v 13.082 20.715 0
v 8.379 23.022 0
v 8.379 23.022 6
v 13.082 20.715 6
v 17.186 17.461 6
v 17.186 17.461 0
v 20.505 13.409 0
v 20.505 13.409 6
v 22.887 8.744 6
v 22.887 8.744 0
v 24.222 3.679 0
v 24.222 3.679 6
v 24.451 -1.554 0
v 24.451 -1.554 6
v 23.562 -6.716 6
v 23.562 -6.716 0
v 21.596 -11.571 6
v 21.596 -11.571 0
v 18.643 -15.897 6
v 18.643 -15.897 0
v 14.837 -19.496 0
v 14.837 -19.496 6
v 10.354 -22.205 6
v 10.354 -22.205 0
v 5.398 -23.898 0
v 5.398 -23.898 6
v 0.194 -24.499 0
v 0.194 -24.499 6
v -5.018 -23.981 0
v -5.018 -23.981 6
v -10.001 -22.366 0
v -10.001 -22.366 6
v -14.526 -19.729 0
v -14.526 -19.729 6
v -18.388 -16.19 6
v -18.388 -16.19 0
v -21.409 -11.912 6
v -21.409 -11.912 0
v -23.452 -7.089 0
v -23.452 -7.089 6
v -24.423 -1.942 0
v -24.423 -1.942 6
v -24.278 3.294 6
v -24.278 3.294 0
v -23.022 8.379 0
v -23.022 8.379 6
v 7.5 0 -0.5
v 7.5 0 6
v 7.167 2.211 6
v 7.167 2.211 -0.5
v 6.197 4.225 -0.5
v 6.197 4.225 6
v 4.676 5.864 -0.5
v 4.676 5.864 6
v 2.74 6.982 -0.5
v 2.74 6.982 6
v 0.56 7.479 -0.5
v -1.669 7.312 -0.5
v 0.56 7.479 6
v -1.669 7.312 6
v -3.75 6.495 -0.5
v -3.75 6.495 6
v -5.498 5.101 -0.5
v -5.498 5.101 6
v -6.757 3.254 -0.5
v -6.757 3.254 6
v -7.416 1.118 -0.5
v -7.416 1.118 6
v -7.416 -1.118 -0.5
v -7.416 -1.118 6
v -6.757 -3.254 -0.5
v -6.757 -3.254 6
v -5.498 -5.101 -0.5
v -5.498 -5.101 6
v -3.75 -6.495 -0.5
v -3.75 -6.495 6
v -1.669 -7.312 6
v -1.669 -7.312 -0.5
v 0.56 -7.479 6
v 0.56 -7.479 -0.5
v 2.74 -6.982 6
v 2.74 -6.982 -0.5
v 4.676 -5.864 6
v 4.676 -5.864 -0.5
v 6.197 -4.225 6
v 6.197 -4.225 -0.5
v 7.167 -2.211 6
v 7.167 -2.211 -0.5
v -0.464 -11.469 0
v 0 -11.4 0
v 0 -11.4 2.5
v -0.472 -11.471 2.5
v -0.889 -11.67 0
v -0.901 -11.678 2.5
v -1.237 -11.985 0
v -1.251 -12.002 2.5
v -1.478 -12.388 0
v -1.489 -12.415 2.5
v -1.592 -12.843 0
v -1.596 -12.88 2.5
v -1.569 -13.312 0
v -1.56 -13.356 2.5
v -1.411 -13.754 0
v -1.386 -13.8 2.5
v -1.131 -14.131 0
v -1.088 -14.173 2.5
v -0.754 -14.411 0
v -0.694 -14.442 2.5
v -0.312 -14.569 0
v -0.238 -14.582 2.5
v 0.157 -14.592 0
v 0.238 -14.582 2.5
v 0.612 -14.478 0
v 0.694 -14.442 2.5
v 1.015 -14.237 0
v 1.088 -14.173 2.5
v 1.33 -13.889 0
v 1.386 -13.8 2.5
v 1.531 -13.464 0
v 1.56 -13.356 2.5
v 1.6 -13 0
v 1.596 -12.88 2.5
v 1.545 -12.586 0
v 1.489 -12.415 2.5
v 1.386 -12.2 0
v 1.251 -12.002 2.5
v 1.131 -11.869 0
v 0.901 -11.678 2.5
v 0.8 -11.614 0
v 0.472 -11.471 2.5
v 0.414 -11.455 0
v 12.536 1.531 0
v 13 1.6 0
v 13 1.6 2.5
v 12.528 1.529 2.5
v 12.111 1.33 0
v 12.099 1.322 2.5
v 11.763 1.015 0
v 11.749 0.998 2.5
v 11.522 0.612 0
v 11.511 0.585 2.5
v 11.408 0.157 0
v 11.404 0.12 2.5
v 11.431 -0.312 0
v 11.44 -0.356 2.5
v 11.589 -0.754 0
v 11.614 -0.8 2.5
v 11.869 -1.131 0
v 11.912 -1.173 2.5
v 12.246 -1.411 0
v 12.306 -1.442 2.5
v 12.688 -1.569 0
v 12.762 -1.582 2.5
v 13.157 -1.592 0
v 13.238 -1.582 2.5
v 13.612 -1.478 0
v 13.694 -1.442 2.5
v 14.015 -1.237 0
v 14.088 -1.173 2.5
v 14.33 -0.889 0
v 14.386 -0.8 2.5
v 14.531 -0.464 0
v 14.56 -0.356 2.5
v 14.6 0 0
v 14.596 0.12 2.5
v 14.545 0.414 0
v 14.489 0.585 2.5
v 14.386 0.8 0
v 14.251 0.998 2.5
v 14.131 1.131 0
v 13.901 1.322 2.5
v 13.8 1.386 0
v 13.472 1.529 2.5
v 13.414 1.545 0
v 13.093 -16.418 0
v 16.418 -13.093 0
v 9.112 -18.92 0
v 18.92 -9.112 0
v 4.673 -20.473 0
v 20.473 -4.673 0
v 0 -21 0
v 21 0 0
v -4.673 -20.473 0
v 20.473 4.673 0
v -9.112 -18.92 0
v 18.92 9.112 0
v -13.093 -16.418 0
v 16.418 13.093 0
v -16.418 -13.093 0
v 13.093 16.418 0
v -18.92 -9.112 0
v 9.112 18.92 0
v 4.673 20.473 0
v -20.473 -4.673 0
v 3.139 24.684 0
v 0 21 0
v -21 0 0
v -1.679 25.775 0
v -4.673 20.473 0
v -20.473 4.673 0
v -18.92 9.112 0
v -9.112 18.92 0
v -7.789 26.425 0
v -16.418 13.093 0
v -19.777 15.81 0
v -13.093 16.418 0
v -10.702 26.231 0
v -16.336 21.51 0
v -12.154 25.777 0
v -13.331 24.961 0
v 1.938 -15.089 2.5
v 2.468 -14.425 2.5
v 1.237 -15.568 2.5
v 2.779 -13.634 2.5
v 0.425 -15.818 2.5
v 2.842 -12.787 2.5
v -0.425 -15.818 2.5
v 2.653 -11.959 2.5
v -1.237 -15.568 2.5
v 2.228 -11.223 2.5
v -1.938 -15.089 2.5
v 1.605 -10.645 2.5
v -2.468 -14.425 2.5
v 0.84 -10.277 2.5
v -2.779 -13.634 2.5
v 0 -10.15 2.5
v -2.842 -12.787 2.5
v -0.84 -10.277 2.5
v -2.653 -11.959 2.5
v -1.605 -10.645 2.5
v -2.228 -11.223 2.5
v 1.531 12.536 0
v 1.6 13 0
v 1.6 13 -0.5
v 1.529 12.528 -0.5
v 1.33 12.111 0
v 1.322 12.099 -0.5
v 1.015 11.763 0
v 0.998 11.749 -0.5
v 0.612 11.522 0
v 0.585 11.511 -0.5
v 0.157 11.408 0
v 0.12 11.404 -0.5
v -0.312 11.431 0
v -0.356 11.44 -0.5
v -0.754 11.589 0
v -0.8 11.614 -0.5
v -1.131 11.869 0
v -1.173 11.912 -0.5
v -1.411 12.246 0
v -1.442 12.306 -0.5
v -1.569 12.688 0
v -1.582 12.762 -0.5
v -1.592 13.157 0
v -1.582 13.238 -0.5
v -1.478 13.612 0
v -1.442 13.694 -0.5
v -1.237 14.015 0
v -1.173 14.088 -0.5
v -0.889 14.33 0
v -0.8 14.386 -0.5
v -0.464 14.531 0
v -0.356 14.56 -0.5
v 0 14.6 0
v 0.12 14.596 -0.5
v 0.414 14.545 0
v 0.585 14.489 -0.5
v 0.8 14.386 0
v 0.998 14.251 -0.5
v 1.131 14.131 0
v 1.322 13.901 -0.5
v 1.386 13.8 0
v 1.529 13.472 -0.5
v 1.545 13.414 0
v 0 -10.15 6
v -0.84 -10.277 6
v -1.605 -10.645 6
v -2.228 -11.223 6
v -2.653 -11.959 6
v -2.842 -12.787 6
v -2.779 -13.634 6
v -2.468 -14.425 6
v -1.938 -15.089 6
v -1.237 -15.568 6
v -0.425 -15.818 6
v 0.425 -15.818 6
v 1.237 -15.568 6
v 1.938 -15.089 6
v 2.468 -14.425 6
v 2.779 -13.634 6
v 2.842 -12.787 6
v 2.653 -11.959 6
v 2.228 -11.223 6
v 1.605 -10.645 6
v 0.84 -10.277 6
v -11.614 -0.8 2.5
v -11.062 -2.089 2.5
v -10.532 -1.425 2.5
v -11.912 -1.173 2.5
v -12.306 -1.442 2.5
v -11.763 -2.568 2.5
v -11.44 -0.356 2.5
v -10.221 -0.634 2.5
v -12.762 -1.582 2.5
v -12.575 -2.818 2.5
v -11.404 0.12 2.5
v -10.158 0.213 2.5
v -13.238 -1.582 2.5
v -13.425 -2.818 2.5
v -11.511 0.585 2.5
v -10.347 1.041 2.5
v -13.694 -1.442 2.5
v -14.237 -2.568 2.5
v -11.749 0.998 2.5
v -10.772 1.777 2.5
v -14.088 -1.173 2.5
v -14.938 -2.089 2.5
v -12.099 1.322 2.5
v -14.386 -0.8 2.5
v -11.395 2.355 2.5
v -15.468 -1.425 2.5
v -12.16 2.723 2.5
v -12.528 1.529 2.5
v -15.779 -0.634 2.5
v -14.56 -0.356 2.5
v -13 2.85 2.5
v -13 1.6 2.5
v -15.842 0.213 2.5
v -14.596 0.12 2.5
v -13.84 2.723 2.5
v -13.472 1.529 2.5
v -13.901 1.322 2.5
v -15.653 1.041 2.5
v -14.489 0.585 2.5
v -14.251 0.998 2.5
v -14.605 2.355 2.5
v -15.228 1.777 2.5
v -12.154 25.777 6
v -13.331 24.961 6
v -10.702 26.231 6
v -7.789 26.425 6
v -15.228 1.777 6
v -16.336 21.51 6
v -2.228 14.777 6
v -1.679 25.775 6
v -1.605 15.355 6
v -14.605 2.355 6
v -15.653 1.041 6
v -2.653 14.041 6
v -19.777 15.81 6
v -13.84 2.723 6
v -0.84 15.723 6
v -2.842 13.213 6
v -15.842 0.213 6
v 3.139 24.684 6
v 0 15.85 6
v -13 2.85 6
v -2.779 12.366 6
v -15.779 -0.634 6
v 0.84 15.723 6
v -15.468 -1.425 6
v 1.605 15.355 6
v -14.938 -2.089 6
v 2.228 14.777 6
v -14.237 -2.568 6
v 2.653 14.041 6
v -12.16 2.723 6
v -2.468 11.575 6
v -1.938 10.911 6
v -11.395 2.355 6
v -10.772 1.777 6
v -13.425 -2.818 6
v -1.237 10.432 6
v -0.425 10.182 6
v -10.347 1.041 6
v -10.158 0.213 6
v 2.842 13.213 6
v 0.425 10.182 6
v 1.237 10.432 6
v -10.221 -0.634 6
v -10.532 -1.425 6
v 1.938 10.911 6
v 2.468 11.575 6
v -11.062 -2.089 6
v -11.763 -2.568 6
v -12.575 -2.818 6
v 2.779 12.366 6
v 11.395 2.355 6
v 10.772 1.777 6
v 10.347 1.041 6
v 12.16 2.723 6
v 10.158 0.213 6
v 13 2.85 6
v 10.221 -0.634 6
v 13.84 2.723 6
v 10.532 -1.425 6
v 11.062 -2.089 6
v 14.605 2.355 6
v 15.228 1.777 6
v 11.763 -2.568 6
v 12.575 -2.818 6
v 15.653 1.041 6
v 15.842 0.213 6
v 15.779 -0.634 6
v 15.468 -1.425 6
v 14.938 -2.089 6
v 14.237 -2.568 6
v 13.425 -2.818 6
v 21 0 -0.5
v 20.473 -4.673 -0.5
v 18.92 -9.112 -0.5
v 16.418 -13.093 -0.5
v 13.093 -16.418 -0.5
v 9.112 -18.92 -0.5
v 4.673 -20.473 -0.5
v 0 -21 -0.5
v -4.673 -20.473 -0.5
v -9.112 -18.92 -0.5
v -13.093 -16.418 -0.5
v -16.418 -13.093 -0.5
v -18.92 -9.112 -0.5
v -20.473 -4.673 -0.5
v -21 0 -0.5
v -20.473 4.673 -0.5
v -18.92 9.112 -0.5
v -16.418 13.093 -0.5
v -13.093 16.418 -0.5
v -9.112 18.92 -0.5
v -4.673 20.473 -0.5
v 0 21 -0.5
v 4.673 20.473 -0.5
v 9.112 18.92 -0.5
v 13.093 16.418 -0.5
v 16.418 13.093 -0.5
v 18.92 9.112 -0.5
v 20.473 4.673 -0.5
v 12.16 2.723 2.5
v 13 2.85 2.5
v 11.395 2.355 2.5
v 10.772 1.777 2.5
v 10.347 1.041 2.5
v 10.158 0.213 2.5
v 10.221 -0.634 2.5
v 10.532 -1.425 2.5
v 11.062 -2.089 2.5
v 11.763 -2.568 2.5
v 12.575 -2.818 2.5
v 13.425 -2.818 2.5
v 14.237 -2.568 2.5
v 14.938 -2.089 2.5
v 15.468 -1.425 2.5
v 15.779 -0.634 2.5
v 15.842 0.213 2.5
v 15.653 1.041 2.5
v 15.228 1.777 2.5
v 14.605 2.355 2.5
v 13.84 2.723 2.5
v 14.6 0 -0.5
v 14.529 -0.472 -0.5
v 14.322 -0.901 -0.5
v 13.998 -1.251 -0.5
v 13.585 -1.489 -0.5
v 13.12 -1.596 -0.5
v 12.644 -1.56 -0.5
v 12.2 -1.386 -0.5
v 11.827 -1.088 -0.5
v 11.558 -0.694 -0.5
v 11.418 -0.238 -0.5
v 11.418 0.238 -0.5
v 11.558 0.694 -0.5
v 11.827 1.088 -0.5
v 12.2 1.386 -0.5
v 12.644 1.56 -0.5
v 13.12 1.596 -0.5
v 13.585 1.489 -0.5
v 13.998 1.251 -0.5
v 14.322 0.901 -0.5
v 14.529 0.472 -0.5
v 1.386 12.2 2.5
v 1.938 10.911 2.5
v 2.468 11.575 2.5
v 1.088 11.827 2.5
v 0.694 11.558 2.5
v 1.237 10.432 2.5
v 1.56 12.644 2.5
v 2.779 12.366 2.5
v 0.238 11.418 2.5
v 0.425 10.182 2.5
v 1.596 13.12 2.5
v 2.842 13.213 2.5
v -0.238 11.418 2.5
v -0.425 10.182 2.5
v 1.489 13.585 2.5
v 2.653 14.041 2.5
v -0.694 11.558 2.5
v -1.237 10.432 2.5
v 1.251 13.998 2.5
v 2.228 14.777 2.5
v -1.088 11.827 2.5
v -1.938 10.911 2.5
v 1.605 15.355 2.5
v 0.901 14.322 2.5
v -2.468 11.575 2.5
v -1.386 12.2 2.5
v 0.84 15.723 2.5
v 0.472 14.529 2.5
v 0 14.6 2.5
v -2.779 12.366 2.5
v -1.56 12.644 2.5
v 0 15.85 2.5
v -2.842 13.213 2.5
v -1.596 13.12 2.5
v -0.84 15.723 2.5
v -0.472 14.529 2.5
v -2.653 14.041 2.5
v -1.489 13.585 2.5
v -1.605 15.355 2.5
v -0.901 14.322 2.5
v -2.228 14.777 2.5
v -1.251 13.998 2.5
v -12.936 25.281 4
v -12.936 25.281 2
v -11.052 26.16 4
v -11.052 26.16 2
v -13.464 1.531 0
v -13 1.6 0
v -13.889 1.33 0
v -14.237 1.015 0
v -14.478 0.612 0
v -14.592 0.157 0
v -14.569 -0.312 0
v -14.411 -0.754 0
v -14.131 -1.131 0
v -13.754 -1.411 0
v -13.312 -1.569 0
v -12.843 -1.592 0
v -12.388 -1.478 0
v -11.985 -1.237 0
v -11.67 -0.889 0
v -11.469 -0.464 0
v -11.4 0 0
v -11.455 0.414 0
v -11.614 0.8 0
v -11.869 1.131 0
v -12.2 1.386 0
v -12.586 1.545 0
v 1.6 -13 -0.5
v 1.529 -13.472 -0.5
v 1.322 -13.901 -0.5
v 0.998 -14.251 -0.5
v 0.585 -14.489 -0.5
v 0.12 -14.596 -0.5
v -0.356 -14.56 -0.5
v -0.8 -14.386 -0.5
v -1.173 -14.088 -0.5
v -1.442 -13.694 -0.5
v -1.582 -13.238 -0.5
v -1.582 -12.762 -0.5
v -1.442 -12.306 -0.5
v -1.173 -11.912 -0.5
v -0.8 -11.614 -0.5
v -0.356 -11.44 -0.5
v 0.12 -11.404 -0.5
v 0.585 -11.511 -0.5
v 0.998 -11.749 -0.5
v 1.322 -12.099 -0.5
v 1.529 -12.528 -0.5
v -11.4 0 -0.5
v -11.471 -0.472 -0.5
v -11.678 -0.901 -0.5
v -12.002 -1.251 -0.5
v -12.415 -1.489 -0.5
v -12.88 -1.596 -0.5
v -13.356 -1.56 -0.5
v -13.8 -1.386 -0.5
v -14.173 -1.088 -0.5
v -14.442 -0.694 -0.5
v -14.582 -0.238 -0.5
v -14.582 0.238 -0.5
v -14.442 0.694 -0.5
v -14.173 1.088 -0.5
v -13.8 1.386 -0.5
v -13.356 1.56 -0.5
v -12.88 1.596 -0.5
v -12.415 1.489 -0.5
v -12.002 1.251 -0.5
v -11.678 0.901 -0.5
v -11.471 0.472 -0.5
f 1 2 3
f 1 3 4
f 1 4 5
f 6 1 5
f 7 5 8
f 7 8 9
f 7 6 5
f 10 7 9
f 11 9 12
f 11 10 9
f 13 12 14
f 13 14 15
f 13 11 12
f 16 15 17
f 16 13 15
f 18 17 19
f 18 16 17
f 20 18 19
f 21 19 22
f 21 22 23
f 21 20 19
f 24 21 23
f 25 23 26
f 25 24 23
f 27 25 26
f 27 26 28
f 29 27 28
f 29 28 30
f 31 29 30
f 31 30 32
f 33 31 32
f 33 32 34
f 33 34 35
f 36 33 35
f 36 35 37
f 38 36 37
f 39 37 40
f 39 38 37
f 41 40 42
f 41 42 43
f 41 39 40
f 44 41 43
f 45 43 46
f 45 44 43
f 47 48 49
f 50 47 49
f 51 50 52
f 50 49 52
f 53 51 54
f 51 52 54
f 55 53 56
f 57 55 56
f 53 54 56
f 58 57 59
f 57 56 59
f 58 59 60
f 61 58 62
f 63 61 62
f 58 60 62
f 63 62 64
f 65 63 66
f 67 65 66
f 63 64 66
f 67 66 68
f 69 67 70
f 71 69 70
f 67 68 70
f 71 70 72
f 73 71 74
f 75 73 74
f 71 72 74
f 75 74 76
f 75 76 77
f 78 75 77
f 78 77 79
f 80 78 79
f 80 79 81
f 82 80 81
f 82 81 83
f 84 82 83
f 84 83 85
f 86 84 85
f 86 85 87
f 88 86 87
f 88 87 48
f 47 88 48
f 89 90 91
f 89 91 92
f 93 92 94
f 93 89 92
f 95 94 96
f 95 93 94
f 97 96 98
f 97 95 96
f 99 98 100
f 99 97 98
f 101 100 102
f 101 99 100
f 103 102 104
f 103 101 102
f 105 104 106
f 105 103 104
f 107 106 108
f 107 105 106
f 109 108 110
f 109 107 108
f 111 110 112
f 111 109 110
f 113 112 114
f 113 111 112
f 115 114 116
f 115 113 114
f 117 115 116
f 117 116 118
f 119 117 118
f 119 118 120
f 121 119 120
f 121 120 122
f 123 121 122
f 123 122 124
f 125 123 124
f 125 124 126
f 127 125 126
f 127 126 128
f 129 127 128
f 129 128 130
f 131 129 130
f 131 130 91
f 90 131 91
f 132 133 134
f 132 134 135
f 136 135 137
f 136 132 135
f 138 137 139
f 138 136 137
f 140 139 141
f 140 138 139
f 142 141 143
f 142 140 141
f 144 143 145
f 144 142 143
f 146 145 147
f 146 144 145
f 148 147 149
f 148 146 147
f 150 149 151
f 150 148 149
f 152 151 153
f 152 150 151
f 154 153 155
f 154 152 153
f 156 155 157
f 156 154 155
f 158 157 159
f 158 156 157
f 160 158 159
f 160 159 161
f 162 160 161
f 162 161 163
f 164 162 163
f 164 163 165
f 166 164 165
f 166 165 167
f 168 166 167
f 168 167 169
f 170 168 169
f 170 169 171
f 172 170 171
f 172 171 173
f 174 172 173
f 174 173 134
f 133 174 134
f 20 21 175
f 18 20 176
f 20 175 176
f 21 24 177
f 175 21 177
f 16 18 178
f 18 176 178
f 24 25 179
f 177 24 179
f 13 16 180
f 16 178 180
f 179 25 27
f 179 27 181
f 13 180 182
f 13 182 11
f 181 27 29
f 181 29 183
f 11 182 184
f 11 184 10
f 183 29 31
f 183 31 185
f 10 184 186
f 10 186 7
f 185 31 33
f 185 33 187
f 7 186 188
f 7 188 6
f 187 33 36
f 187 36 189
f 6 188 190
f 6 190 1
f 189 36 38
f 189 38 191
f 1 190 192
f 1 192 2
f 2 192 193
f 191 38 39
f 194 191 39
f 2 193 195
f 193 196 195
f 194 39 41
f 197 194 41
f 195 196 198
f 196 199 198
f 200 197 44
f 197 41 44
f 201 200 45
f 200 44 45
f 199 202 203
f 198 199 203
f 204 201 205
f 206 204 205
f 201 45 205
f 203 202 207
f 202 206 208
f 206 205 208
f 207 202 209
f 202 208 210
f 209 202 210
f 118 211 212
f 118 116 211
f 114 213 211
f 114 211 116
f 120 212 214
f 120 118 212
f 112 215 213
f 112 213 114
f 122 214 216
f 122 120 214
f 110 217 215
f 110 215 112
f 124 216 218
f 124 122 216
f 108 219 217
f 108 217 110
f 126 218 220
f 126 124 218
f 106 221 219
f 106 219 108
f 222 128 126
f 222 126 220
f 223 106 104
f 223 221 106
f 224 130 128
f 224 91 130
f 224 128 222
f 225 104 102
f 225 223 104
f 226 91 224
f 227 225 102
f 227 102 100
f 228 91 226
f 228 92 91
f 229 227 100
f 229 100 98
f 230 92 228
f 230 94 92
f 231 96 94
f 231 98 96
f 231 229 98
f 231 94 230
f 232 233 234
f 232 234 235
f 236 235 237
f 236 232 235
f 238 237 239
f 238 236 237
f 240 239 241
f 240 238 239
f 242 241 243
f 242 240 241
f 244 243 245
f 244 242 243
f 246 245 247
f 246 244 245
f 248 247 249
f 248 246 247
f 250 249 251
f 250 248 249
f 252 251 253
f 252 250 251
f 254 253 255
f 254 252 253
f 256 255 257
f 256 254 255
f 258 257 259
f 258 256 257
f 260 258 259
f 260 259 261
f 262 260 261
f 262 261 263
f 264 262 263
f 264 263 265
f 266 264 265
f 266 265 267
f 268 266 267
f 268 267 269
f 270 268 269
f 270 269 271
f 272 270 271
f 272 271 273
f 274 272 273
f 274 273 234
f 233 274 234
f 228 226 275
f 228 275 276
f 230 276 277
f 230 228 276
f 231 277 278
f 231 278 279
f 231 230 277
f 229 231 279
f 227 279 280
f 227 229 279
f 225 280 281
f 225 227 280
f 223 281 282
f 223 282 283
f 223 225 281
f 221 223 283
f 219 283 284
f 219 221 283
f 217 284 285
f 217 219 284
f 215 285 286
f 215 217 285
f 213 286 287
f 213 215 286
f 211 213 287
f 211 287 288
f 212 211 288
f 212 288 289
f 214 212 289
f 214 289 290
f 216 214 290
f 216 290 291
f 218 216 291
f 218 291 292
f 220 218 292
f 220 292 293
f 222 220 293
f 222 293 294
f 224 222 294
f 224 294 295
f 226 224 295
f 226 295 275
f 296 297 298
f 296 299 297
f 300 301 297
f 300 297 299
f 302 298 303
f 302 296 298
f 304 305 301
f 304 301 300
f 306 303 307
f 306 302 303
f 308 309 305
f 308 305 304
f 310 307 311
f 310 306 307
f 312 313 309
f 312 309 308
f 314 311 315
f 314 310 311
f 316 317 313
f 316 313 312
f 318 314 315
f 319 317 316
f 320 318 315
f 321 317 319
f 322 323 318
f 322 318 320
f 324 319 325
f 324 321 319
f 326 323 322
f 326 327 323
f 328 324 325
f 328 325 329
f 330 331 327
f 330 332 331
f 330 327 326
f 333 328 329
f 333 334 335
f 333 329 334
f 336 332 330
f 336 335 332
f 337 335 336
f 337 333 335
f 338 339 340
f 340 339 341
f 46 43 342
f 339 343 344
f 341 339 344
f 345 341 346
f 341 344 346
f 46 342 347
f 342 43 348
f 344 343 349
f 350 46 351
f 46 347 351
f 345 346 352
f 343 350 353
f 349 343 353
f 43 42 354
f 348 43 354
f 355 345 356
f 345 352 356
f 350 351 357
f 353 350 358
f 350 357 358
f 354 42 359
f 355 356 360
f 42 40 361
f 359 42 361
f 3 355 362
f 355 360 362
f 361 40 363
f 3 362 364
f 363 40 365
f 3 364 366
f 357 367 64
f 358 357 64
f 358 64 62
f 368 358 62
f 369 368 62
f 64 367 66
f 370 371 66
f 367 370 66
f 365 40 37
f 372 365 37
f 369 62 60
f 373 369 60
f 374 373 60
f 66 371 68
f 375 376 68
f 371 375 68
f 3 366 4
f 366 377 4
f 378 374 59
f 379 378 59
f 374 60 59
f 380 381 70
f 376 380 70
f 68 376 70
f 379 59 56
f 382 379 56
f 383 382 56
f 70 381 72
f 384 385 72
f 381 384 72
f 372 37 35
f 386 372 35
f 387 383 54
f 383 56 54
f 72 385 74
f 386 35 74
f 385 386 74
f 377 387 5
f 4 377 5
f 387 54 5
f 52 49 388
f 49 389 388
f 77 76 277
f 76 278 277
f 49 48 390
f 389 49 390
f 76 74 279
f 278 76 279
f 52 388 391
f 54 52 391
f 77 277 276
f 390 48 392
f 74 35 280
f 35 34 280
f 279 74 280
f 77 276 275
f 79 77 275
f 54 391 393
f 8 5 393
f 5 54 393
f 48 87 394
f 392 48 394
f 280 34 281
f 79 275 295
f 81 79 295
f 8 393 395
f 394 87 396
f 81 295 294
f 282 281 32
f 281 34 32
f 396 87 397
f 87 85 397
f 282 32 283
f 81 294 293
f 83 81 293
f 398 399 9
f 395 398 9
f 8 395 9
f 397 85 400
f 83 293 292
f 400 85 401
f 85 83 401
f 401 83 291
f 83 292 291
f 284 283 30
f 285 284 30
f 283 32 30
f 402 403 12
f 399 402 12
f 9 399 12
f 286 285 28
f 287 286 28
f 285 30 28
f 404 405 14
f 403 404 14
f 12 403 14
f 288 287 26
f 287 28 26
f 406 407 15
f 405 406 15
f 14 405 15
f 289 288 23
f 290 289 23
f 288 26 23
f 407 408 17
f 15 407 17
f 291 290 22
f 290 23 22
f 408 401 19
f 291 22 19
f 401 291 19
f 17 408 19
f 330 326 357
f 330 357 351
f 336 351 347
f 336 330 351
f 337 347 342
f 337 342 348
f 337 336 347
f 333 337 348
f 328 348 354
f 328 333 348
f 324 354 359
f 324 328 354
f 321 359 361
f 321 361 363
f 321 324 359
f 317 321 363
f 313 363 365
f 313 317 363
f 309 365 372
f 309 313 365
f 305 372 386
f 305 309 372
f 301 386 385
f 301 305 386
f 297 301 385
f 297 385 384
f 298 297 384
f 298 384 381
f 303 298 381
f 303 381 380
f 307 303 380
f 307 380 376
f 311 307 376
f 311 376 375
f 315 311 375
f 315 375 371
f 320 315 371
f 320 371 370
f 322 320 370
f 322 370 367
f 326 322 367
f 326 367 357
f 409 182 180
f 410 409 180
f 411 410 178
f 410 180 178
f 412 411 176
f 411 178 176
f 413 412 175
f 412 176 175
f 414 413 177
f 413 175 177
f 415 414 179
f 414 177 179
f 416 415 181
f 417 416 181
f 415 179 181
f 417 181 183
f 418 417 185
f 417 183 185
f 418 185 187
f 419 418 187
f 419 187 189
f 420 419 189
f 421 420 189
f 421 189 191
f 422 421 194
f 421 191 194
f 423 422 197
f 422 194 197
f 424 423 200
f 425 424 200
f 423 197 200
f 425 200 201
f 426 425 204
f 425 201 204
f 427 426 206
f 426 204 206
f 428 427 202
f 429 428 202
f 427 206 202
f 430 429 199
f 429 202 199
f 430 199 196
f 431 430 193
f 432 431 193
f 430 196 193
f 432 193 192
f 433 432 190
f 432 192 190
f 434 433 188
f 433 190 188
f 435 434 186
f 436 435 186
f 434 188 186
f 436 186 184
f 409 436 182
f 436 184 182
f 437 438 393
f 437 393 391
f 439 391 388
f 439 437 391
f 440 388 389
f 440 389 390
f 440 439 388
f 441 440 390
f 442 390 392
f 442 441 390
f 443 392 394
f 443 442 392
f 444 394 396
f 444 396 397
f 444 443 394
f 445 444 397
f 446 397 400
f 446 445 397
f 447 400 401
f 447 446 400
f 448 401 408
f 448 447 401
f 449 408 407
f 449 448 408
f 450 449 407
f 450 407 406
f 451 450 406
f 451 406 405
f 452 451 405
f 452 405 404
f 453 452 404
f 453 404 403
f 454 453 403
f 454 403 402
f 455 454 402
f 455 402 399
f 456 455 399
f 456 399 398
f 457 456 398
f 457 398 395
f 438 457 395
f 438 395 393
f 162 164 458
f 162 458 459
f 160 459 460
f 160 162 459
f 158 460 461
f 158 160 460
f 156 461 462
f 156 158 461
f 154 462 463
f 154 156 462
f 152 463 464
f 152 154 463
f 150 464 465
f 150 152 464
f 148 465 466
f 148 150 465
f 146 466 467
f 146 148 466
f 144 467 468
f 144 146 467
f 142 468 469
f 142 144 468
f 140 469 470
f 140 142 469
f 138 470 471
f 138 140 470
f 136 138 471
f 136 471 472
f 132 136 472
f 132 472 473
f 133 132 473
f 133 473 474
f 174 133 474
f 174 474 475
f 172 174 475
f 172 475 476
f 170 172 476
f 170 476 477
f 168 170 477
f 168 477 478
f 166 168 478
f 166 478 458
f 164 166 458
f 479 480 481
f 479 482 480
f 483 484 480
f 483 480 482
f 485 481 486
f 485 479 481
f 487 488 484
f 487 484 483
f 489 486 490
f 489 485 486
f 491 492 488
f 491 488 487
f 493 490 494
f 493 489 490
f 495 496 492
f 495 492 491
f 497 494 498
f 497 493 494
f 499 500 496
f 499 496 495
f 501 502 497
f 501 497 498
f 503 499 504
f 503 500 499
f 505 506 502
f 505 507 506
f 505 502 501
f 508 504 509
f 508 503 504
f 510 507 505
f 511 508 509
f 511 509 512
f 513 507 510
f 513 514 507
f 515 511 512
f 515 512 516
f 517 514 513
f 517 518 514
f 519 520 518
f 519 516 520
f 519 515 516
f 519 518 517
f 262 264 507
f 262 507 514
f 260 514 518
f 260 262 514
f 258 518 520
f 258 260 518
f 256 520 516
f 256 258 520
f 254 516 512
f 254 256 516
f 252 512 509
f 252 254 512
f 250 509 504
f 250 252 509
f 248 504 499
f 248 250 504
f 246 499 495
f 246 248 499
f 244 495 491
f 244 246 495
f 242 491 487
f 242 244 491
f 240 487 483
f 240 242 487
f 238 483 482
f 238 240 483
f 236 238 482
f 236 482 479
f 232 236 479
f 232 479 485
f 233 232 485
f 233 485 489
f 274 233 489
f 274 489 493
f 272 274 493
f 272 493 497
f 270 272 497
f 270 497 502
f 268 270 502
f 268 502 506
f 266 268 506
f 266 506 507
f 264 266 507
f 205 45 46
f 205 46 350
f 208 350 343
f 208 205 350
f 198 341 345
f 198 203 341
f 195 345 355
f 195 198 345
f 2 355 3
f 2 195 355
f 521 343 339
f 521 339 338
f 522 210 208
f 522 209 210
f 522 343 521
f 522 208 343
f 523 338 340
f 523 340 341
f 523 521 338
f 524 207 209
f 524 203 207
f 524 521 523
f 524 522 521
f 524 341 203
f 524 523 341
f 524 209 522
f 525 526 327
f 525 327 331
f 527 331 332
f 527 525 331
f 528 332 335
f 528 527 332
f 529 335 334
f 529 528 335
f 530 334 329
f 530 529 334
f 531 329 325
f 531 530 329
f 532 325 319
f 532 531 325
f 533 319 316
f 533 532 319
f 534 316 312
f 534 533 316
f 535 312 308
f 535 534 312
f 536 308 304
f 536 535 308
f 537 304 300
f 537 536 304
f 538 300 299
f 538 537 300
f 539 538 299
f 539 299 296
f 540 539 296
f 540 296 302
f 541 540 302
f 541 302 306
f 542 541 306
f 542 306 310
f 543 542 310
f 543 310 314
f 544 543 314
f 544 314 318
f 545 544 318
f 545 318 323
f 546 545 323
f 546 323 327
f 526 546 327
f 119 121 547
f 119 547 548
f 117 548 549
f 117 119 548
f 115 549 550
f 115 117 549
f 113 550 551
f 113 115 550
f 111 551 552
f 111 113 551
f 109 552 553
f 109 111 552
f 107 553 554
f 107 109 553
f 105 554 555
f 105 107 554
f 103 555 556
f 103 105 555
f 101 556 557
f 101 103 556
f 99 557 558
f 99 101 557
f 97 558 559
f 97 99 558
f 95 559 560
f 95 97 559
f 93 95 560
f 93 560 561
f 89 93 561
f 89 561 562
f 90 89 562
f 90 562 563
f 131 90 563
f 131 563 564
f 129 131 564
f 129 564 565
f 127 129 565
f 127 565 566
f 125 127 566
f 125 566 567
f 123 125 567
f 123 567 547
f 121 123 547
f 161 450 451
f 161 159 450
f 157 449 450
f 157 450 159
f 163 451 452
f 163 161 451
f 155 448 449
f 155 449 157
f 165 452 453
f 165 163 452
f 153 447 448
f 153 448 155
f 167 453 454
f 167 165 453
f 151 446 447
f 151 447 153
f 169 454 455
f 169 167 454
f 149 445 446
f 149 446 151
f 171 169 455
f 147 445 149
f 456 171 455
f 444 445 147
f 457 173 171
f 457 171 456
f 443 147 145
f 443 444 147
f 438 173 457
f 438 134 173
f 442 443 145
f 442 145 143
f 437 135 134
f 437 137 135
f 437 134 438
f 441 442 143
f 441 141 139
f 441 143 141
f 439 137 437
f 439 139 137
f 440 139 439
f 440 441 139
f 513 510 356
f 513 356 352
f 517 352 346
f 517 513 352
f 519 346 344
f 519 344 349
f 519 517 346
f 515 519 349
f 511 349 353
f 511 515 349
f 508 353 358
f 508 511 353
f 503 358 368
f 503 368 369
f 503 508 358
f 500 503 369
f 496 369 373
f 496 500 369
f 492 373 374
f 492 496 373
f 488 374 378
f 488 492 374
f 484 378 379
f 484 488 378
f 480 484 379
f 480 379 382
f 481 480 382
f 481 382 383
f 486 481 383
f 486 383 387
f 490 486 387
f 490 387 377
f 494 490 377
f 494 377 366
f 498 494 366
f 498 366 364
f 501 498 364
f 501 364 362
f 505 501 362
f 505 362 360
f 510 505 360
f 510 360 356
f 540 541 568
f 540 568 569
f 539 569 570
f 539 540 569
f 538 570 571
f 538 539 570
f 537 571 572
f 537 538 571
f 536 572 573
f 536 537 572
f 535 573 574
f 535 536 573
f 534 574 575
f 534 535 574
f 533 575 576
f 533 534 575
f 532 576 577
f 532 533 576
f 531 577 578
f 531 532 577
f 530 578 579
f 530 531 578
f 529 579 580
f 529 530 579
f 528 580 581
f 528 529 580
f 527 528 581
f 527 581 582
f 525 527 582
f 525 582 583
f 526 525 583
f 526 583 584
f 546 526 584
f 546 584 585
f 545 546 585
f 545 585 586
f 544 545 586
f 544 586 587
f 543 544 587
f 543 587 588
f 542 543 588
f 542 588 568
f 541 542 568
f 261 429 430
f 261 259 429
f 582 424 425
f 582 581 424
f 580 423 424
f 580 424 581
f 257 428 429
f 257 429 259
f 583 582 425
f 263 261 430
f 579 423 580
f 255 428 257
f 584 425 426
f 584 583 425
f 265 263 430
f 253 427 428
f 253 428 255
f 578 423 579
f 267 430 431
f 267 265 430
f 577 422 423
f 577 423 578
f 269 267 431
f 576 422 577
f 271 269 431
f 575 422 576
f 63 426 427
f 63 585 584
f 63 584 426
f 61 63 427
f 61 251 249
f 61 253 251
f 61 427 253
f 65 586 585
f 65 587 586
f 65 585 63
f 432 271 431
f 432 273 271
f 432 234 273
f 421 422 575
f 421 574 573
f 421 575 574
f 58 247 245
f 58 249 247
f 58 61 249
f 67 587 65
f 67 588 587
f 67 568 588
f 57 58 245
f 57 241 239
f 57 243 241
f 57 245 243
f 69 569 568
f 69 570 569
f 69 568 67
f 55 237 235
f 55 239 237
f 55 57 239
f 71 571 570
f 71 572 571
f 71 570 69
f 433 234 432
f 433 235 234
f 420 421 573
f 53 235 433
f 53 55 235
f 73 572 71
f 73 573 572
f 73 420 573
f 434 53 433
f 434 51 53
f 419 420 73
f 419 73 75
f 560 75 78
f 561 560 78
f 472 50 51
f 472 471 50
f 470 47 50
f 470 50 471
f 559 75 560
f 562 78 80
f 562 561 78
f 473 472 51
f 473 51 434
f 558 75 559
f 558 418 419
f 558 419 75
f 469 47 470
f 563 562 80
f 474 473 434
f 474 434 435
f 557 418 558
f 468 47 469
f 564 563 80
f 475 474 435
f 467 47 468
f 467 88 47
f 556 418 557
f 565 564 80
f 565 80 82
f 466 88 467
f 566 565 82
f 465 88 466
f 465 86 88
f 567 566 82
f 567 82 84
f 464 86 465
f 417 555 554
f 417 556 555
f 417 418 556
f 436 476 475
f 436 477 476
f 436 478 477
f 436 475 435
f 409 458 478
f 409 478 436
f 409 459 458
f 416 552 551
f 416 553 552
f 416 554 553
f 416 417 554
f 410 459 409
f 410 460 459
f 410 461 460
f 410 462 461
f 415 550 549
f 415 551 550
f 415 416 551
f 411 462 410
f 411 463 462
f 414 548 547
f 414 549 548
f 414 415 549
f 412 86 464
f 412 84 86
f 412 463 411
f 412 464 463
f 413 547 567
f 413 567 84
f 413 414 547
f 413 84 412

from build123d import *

# Parameters (mm, degrees)
SKETCH1_R           = 21
SKETCH1_R_2         = 2.85
BOSS_EXTRUDE1_DEPTH = 6
SKETCH2_R           = 24.5
SKETCH2_R_2         = 21
BOSS_EXTRUDE3_DEPTH = 6
SKETCH1_4_R         = 2.85
SKETCH1_4_R_2       = 1.6
BOSS_EXTRUDE2_DEPTH = 2.5
SKETCH3_R           = 21
SKETCH3_R_2         = 1.6
BOSS_EXTRUDE4_DEPTH = 0.5
SKETCH4_R           = 7.5
CUT_EXTRUDE1_DEPTH  = 7.5


with BuildPart() as part:
    # Sketch1 → Boss-Extrude1 (new body)
    with BuildSketch(Plane(origin=(0, 0, 0), x_dir=(0, 1, 0), z_dir=(0, 0, 1))):
        Circle(SKETCH1_R)
        with Locations((-13, 0)):
            Circle(SKETCH1_R_2, mode=Mode.SUBTRACT)
        with Locations((0, -13)):
            Circle(SKETCH1_R_2, mode=Mode.SUBTRACT)
        with Locations((13, 0)):
            Circle(SKETCH1_R_2, mode=Mode.SUBTRACT)
        with Locations((0, 13)):
            Circle(SKETCH1_R_2, mode=Mode.SUBTRACT)
    extrude(amount=BOSS_EXTRUDE1_DEPTH)

    # Sketch2 → Boss-Extrude3 (add)
    with BuildSketch(Plane(origin=(0, 0, 0), x_dir=(1, 0, 0), z_dir=(0, 0, -1))):
        Circle(SKETCH2_R)
        Circle(SKETCH2_R_2, mode=Mode.SUBTRACT)
        with BuildLine():
            ThreePointArc((8.379493511, -23.022469209), (-10.354147413, -22.204540782), (-23.022469209, -8.379493511))
            add(Edge.make_bspline(
                [(-23.022469209, -8.379493511), (-19.944287919, -16.836727099), (-14.723681196, -24.624750138), (-9.399453165, -27.107478442), (-0.077740076, -26.100650499), (8.379493511, -23.022469209)],
                knots=[0, 0, 0, 0, 0.45, 0.55, 1, 1, 1, 1], degree=3))
        make_face()
    extrude(amount=-BOSS_EXTRUDE3_DEPTH)

    # Sketch1<4> → Boss-Extrude2 (add)
    with BuildSketch(Plane(origin=(0, 0, 0), x_dir=(0, 1, 0), z_dir=(0, 0, 1))):
        with Locations((-13, 0)):
            Circle(SKETCH1_4_R)
        with Locations((-13, 0)):
            Circle(SKETCH1_4_R_2, mode=Mode.SUBTRACT)
        with Locations((0, 13)):
            Circle(SKETCH1_4_R)
        with Locations((0, 13)):
            Circle(SKETCH1_4_R_2, mode=Mode.SUBTRACT)
        with Locations((13, 0)):
            Circle(SKETCH1_4_R)
        with Locations((13, 0)):
            Circle(SKETCH1_4_R_2, mode=Mode.SUBTRACT)
        with Locations((0, -13)):
            Circle(SKETCH1_4_R)
        with Locations((0, -13)):
            Circle(SKETCH1_4_R_2, mode=Mode.SUBTRACT)
    extrude(amount=BOSS_EXTRUDE2_DEPTH)

    # Sketch3 → Boss-Extrude4 (add)
    with BuildSketch(Plane(origin=(0, 0, 0), x_dir=(1, 0, 0), z_dir=(0, 0, -1))):
        Circle(SKETCH3_R)
        with Locations((13, 0)):
            Circle(SKETCH3_R_2, mode=Mode.SUBTRACT)
        with Locations((0, 13)):
            Circle(SKETCH3_R_2, mode=Mode.SUBTRACT)
        with Locations((-13, 0)):
            Circle(SKETCH3_R_2, mode=Mode.SUBTRACT)
        with Locations((0, -13)):
            Circle(SKETCH3_R_2, mode=Mode.SUBTRACT)
    extrude(amount=BOSS_EXTRUDE4_DEPTH)

    # Sketch4 → Cut-Extrude1 (cut, through all)
    with BuildSketch(Plane.XY.offset(6)):
        Circle(SKETCH4_R)
    extrude(amount=-CUT_EXTRUDE1_DEPTH, mode=Mode.SUBTRACT)


solid = part.part
